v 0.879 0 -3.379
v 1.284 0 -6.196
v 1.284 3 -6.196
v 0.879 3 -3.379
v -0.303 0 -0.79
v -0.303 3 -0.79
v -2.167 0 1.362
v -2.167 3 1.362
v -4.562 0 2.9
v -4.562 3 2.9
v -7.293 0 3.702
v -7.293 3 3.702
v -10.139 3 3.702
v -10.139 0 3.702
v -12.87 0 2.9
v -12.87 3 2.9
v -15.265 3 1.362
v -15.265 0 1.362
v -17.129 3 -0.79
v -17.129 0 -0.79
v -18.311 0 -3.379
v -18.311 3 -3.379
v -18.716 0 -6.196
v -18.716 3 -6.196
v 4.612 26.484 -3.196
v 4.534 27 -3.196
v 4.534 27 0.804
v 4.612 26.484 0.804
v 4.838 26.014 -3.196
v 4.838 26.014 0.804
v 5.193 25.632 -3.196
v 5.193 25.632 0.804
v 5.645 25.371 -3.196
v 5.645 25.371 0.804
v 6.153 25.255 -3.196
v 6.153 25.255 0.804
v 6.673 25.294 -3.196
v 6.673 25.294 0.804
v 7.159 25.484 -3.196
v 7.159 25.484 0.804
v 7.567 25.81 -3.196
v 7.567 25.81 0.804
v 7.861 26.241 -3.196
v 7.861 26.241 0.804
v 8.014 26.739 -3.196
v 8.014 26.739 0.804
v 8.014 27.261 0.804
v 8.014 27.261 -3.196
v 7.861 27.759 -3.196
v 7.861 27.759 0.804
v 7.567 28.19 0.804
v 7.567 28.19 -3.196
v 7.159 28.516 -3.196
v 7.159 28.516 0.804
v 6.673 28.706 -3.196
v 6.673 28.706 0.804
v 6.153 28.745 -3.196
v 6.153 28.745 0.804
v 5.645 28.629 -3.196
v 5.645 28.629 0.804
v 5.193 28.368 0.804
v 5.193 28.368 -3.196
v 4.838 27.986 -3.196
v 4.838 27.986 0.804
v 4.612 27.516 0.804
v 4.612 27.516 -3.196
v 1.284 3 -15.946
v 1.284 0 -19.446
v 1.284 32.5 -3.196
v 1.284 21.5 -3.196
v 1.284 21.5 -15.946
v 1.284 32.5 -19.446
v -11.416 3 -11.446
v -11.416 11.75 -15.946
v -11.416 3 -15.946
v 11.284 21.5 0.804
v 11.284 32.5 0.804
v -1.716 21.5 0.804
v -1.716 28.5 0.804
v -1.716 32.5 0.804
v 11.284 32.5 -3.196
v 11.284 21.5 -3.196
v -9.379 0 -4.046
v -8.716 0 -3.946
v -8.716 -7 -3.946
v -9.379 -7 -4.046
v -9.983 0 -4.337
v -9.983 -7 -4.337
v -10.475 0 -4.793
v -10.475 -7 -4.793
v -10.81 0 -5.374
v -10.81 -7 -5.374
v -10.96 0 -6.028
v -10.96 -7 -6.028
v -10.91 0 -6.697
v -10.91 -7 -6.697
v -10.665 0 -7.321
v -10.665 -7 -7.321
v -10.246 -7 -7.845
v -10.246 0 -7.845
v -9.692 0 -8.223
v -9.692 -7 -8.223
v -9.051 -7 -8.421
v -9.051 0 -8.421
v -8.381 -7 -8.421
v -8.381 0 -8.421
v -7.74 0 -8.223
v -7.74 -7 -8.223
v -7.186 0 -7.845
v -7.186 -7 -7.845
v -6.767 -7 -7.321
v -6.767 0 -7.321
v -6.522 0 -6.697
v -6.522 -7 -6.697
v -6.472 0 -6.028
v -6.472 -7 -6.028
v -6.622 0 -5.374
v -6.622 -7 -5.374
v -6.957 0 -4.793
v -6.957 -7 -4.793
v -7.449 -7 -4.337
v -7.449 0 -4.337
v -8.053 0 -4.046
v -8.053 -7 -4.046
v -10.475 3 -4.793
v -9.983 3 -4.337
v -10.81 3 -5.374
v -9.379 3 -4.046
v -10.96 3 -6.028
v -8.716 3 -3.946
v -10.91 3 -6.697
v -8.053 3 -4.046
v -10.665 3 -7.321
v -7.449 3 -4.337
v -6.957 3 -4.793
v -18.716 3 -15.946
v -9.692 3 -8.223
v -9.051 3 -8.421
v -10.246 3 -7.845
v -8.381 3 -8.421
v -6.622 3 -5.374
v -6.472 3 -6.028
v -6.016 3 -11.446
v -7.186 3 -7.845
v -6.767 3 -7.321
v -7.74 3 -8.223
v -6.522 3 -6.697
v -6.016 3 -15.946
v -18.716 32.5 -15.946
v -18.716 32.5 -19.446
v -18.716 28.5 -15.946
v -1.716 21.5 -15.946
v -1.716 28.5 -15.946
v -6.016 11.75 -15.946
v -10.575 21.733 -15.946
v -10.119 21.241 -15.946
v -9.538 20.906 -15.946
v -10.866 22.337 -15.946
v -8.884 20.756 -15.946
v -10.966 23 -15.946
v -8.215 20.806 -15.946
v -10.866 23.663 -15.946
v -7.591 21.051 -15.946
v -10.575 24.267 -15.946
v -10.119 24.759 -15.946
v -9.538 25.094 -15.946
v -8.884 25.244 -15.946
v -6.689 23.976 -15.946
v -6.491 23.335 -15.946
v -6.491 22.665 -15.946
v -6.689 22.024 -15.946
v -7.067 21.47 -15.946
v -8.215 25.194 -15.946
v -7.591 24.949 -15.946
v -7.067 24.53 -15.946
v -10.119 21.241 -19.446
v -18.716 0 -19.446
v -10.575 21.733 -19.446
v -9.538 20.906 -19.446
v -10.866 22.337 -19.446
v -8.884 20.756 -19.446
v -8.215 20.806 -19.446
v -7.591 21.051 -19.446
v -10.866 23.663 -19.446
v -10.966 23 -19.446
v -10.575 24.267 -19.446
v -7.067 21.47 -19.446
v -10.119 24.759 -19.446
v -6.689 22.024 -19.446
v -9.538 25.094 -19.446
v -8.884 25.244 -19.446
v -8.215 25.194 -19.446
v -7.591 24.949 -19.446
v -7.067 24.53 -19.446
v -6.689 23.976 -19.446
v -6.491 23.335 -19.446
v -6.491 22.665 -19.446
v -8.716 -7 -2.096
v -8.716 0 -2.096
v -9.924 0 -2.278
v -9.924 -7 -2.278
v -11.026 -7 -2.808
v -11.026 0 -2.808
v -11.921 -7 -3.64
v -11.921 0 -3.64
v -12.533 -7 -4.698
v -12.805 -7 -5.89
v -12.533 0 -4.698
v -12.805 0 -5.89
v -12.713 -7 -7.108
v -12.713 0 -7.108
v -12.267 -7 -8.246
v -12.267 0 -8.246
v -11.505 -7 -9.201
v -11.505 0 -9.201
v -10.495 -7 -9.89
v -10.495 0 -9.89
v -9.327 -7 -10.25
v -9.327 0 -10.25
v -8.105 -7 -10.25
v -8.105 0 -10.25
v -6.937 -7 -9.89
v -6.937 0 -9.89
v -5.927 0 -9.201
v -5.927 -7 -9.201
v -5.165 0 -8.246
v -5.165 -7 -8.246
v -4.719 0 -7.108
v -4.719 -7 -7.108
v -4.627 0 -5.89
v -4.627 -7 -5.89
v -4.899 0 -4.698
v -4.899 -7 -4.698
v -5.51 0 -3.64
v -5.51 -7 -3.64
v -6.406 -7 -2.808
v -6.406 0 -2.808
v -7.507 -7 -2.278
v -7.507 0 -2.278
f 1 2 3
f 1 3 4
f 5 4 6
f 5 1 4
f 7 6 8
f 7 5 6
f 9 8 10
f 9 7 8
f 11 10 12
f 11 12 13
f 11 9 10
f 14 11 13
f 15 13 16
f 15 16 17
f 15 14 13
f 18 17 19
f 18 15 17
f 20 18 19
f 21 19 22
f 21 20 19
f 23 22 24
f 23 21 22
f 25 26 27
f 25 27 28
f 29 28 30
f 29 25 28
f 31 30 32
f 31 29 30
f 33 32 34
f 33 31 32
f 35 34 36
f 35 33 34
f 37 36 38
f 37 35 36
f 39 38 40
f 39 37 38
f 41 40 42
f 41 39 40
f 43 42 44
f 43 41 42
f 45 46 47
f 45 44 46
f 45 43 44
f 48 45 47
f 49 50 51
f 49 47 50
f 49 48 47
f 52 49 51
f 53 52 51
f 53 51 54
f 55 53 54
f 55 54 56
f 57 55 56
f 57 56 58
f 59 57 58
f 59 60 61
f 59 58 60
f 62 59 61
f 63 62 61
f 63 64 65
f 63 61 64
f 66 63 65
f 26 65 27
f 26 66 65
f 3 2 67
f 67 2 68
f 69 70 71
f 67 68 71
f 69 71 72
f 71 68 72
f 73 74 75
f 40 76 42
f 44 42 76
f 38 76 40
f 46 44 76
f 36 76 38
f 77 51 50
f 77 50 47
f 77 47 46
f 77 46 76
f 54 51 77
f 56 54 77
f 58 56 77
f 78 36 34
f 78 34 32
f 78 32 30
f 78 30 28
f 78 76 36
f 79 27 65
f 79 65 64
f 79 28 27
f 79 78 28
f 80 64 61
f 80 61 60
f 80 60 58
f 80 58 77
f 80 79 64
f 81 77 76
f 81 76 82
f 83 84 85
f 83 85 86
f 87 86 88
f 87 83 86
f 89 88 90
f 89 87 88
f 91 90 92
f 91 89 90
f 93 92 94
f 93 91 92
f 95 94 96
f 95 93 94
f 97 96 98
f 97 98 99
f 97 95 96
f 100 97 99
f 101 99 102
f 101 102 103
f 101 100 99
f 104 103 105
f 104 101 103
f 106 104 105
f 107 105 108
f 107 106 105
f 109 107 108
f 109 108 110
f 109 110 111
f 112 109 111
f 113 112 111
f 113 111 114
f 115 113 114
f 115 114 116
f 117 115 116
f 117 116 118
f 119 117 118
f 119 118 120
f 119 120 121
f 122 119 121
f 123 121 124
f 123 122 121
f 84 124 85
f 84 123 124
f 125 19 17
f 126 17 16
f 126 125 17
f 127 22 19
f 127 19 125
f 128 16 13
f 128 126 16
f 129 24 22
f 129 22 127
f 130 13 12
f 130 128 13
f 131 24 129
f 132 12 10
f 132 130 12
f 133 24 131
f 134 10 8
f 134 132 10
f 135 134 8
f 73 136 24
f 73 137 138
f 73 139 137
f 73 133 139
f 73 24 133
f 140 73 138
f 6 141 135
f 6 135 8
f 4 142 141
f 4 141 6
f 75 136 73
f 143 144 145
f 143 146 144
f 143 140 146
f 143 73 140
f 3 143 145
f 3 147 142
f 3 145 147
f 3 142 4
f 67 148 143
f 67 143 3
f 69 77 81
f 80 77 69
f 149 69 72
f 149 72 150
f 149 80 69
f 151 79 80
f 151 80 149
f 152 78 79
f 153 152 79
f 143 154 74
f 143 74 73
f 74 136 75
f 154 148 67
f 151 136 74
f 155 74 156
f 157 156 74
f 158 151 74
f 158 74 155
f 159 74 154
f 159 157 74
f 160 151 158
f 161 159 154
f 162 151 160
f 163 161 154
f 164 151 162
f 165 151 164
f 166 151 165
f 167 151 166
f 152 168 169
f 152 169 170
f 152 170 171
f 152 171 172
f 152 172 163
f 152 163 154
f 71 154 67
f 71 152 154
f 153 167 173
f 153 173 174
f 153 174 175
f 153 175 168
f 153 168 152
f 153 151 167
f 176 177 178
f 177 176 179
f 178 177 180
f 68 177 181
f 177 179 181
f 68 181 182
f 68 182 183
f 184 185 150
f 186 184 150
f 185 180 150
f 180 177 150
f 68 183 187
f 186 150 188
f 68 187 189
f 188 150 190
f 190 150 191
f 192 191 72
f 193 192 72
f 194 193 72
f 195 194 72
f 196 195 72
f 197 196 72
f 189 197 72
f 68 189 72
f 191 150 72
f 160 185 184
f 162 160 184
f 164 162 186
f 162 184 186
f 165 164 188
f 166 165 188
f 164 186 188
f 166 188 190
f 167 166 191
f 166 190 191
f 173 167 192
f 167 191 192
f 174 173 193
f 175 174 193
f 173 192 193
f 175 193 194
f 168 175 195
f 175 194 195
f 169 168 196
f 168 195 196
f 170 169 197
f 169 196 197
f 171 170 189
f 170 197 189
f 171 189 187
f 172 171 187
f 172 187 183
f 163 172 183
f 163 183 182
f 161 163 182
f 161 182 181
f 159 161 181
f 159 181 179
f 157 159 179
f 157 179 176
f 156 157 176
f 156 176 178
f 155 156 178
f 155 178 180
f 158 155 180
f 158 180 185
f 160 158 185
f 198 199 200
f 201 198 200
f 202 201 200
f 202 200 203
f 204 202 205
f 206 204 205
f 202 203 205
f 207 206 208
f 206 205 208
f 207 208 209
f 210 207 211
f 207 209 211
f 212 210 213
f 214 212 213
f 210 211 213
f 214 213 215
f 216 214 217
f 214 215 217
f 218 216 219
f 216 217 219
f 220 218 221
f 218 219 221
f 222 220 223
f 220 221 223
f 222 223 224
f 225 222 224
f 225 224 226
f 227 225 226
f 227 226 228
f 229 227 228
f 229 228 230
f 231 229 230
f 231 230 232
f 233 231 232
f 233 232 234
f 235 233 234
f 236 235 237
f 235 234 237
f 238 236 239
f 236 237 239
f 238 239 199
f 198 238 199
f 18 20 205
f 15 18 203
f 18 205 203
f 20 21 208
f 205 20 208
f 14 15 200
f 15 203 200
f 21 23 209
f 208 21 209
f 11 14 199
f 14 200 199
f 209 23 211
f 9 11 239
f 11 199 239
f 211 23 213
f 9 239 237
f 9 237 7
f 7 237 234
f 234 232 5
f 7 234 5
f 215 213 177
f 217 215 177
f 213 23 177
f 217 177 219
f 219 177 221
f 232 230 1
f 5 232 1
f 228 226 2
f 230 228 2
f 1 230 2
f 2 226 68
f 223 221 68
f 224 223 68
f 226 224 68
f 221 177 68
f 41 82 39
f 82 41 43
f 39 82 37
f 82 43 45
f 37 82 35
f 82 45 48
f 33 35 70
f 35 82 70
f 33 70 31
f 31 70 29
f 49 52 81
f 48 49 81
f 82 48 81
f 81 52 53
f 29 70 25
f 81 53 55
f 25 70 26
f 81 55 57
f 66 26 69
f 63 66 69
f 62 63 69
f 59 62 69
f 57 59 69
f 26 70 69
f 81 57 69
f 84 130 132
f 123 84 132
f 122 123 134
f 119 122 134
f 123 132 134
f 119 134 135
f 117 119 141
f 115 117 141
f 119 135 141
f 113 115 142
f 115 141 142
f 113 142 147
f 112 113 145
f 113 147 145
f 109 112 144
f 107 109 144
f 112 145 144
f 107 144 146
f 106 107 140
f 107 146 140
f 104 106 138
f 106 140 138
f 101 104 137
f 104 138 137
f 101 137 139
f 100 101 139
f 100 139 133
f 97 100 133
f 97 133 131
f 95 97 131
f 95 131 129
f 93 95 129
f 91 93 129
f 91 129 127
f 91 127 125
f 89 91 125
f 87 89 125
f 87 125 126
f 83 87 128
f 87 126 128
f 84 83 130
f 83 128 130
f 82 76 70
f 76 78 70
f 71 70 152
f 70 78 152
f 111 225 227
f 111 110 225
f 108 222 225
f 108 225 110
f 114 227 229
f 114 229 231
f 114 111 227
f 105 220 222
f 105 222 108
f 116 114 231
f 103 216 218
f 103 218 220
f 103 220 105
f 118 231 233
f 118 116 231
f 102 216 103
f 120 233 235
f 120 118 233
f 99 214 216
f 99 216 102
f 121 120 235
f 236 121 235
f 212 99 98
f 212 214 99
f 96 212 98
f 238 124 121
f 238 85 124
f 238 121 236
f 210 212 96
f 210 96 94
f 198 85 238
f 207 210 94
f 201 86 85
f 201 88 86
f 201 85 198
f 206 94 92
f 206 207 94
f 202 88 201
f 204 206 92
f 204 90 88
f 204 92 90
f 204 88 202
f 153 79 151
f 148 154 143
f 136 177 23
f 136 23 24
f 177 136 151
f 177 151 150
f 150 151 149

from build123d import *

# Parameters (mm, degrees)
CROQUIS1_W              = 20
CROQUIS1_H              = 13.25
SALIENTE_EXTRUIR1_DEPTH = 3
CROQUIS3_R              = 2.25
CORTAR_EXTRUIR1_DEPTH   = 3
CROQUIS7_W              = 20
CROQUIS7_H              = 3.5
SALIENTE_EXTRUIR4_DEPTH = 25
CROQUIS6_R              = 4.1
CROQUIS6_R_2            = 2.25
SALIENTE_EXTRUIR3_DEPTH = 7
CROQUIS8_R              = 2.25
CORTAR_EXTRUIR3_DEPTH   = 23
NERVIO6_REACH           = 37.527
CROQUIS20_WALL_W        = 82.892721144
CROQUIS20_WALL_H        = 5.4
CROQUIS28_W             = 20
CROQUIS28_H             = 4.5
SALIENTE_EXTRUIR6_DEPTH = 3.5
CROQUIS29_W             = 3
CROQUIS29_H             = 11
SALIENTE_EXTRUIR7_DEPTH = 16.75
CROQUIS31_W             = 4
CROQUIS31_H             = 11
SALIENTE_EXTRUIR8_DEPTH = 10
CROQUIS27_R             = 1.75
CORTAR_EXTRUIR5_DEPTH   = 24
NERVIO7_REACH           = 49.84
CROQUIS32_WALL_W        = 121.545885618
CROQUIS32_WALL_H        = 4


with BuildPart() as part:
    # Croquis1 → Saliente-Extruir1 (new body)
    with BuildSketch(Plane(origin=(0, 0, 0), x_dir=(1, 0, 0), z_dir=(0, 1, 0))):
        with Locations((-8.715974267, 12.820975022)):
            Rectangle(CROQUIS1_W, CROQUIS1_H)
        with BuildLine():
            Line((-18.715974267, 6.195975022), (1.284025733, 6.195975022))
            ThreePointArc((1.284025733, 6.195975022), (-8.715974267, -3.804024978), (-18.715974267, 6.195975022))
        make_face()
    extrude(amount=SALIENTE_EXTRUIR1_DEPTH)

    # Croquis3 → Cortar-Extruir1 (cut)
    with BuildSketch(Plane(origin=(0, 3, 0), x_dir=(1, 0, 0), z_dir=(0, 1, 0))):
        with Locations(Location((-8.715974267, 6.195975022, 0), (0, 0, 270))):
            Circle(CROQUIS3_R)
    extrude(amount=-CORTAR_EXTRUIR1_DEPTH, mode=Mode.SUBTRACT)

    # Croquis7 → Saliente-Extruir4 (add)
    with BuildSketch(Plane(origin=(0, 3, 0), x_dir=(1, 0, 0), z_dir=(0, 1, 0))):
        with Locations((-8.715974267, 17.695975022)):
            Rectangle(CROQUIS7_W, CROQUIS7_H)
    extrude(amount=SALIENTE_EXTRUIR4_DEPTH)

    # Croquis6 → Saliente-Extruir3 (add)
    with BuildSketch(Plane.XZ):
        with Locations(Location((-8.715974267, -6.195975022, 0), (0, 0, 90))):
            Circle(CROQUIS6_R)
        with Locations(Location((-8.715974267, -6.195975022, 0), (0, 0, 90))):
            Circle(CROQUIS6_R_2, mode=Mode.SUBTRACT)
    extrude(amount=SALIENTE_EXTRUIR3_DEPTH)

    # Croquis8 → Cortar-Extruir3 (cut)
    with BuildSketch(Plane(origin=(0, 0, -19.445975022), x_dir=(-1, 0, 0), z_dir=(0, 0, -1))):
        with Locations((8.715974267, 23)):
            Circle(CROQUIS8_R)
    extrude(amount=-CORTAR_EXTRUIR3_DEPTH, mode=Mode.SUBTRACT)

    # Croquis20 wall → Nervio6 (add, up to next)
    with BuildSketch(Plane(origin=(-8.715974267, 7.375, -13.695975022), x_dir=(0, -0.889287802318, 0.457348012621), z_dir=(0, 0.457348012621, 0.889287802318)), mode=Mode.PRIVATE) as nervio6_sk1:
        Rectangle(CROQUIS20_WALL_W, CROQUIS20_WALL_H)
    nervio6_tool1 = extrude(nervio6_sk1.sketch, amount=-NERVIO6_REACH, mode=Mode.PRIVATE) - part.part
    add(nervio6_tool1.solids().sort_by_distance((-8.715974267, 7.375, -13.695975022))[0])

    # Croquis28 → Saliente-Extruir6 (add)
    with BuildSketch(Plane.XY.offset(-15.945975022)):
        with Locations((-8.715974267, 30.25)):
            Rectangle(CROQUIS28_W, CROQUIS28_H)
    extrude(amount=-SALIENTE_EXTRUIR6_DEPTH)

    # Croquis29 → Saliente-Extruir7 (add)
    with BuildSketch(Plane.XY.offset(-15.945975022)):
        with Locations((-0.215974267, 27)):
            Rectangle(CROQUIS29_W, CROQUIS29_H)
    extrude(amount=SALIENTE_EXTRUIR7_DEPTH)

    # Croquis31 → Saliente-Extruir8 (add)
    with BuildSketch(Plane(origin=(1.284025733, 0, 0), x_dir=(0, 0, -1), z_dir=(1, 0, 0))):
        with Locations((1.195975022, 27)):
            Rectangle(CROQUIS31_W, CROQUIS31_H)
    extrude(amount=SALIENTE_EXTRUIR8_DEPTH)

    # Croquis27 → Cortar-Extruir5 (cut)
    with BuildSketch(Plane.XY.offset(-15.945975022)):
        with Locations(Location((6.284025733, 27, 0), (0, 0, 180))):
            Circle(CROQUIS27_R)
    extrude(amount=CORTAR_EXTRUIR5_DEPTH, mode=Mode.SUBTRACT)

    # Croquis32 wall → Nervio7 (add, up to next)
    with BuildSketch(Plane(origin=(-10.215974267, 32.5, -7.570975022), x_dir=(-0.712325066938, 0, -0.701849698306), z_dir=(-0.701849698306, 0, 0.712325066938)), mode=Mode.PRIVATE) as nervio7_sk1:
        with Locations((0, 2)):
            Rectangle(CROQUIS32_WALL_W, CROQUIS32_WALL_H)
    nervio7_tool1 = extrude(nervio7_sk1.sketch, amount=-NERVIO7_REACH, mode=Mode.PRIVATE) - part.part
    add(nervio7_tool1.solids().sort_by_distance((-10.215974267, 32.5, -7.570975022))[0])


solid = part.part
